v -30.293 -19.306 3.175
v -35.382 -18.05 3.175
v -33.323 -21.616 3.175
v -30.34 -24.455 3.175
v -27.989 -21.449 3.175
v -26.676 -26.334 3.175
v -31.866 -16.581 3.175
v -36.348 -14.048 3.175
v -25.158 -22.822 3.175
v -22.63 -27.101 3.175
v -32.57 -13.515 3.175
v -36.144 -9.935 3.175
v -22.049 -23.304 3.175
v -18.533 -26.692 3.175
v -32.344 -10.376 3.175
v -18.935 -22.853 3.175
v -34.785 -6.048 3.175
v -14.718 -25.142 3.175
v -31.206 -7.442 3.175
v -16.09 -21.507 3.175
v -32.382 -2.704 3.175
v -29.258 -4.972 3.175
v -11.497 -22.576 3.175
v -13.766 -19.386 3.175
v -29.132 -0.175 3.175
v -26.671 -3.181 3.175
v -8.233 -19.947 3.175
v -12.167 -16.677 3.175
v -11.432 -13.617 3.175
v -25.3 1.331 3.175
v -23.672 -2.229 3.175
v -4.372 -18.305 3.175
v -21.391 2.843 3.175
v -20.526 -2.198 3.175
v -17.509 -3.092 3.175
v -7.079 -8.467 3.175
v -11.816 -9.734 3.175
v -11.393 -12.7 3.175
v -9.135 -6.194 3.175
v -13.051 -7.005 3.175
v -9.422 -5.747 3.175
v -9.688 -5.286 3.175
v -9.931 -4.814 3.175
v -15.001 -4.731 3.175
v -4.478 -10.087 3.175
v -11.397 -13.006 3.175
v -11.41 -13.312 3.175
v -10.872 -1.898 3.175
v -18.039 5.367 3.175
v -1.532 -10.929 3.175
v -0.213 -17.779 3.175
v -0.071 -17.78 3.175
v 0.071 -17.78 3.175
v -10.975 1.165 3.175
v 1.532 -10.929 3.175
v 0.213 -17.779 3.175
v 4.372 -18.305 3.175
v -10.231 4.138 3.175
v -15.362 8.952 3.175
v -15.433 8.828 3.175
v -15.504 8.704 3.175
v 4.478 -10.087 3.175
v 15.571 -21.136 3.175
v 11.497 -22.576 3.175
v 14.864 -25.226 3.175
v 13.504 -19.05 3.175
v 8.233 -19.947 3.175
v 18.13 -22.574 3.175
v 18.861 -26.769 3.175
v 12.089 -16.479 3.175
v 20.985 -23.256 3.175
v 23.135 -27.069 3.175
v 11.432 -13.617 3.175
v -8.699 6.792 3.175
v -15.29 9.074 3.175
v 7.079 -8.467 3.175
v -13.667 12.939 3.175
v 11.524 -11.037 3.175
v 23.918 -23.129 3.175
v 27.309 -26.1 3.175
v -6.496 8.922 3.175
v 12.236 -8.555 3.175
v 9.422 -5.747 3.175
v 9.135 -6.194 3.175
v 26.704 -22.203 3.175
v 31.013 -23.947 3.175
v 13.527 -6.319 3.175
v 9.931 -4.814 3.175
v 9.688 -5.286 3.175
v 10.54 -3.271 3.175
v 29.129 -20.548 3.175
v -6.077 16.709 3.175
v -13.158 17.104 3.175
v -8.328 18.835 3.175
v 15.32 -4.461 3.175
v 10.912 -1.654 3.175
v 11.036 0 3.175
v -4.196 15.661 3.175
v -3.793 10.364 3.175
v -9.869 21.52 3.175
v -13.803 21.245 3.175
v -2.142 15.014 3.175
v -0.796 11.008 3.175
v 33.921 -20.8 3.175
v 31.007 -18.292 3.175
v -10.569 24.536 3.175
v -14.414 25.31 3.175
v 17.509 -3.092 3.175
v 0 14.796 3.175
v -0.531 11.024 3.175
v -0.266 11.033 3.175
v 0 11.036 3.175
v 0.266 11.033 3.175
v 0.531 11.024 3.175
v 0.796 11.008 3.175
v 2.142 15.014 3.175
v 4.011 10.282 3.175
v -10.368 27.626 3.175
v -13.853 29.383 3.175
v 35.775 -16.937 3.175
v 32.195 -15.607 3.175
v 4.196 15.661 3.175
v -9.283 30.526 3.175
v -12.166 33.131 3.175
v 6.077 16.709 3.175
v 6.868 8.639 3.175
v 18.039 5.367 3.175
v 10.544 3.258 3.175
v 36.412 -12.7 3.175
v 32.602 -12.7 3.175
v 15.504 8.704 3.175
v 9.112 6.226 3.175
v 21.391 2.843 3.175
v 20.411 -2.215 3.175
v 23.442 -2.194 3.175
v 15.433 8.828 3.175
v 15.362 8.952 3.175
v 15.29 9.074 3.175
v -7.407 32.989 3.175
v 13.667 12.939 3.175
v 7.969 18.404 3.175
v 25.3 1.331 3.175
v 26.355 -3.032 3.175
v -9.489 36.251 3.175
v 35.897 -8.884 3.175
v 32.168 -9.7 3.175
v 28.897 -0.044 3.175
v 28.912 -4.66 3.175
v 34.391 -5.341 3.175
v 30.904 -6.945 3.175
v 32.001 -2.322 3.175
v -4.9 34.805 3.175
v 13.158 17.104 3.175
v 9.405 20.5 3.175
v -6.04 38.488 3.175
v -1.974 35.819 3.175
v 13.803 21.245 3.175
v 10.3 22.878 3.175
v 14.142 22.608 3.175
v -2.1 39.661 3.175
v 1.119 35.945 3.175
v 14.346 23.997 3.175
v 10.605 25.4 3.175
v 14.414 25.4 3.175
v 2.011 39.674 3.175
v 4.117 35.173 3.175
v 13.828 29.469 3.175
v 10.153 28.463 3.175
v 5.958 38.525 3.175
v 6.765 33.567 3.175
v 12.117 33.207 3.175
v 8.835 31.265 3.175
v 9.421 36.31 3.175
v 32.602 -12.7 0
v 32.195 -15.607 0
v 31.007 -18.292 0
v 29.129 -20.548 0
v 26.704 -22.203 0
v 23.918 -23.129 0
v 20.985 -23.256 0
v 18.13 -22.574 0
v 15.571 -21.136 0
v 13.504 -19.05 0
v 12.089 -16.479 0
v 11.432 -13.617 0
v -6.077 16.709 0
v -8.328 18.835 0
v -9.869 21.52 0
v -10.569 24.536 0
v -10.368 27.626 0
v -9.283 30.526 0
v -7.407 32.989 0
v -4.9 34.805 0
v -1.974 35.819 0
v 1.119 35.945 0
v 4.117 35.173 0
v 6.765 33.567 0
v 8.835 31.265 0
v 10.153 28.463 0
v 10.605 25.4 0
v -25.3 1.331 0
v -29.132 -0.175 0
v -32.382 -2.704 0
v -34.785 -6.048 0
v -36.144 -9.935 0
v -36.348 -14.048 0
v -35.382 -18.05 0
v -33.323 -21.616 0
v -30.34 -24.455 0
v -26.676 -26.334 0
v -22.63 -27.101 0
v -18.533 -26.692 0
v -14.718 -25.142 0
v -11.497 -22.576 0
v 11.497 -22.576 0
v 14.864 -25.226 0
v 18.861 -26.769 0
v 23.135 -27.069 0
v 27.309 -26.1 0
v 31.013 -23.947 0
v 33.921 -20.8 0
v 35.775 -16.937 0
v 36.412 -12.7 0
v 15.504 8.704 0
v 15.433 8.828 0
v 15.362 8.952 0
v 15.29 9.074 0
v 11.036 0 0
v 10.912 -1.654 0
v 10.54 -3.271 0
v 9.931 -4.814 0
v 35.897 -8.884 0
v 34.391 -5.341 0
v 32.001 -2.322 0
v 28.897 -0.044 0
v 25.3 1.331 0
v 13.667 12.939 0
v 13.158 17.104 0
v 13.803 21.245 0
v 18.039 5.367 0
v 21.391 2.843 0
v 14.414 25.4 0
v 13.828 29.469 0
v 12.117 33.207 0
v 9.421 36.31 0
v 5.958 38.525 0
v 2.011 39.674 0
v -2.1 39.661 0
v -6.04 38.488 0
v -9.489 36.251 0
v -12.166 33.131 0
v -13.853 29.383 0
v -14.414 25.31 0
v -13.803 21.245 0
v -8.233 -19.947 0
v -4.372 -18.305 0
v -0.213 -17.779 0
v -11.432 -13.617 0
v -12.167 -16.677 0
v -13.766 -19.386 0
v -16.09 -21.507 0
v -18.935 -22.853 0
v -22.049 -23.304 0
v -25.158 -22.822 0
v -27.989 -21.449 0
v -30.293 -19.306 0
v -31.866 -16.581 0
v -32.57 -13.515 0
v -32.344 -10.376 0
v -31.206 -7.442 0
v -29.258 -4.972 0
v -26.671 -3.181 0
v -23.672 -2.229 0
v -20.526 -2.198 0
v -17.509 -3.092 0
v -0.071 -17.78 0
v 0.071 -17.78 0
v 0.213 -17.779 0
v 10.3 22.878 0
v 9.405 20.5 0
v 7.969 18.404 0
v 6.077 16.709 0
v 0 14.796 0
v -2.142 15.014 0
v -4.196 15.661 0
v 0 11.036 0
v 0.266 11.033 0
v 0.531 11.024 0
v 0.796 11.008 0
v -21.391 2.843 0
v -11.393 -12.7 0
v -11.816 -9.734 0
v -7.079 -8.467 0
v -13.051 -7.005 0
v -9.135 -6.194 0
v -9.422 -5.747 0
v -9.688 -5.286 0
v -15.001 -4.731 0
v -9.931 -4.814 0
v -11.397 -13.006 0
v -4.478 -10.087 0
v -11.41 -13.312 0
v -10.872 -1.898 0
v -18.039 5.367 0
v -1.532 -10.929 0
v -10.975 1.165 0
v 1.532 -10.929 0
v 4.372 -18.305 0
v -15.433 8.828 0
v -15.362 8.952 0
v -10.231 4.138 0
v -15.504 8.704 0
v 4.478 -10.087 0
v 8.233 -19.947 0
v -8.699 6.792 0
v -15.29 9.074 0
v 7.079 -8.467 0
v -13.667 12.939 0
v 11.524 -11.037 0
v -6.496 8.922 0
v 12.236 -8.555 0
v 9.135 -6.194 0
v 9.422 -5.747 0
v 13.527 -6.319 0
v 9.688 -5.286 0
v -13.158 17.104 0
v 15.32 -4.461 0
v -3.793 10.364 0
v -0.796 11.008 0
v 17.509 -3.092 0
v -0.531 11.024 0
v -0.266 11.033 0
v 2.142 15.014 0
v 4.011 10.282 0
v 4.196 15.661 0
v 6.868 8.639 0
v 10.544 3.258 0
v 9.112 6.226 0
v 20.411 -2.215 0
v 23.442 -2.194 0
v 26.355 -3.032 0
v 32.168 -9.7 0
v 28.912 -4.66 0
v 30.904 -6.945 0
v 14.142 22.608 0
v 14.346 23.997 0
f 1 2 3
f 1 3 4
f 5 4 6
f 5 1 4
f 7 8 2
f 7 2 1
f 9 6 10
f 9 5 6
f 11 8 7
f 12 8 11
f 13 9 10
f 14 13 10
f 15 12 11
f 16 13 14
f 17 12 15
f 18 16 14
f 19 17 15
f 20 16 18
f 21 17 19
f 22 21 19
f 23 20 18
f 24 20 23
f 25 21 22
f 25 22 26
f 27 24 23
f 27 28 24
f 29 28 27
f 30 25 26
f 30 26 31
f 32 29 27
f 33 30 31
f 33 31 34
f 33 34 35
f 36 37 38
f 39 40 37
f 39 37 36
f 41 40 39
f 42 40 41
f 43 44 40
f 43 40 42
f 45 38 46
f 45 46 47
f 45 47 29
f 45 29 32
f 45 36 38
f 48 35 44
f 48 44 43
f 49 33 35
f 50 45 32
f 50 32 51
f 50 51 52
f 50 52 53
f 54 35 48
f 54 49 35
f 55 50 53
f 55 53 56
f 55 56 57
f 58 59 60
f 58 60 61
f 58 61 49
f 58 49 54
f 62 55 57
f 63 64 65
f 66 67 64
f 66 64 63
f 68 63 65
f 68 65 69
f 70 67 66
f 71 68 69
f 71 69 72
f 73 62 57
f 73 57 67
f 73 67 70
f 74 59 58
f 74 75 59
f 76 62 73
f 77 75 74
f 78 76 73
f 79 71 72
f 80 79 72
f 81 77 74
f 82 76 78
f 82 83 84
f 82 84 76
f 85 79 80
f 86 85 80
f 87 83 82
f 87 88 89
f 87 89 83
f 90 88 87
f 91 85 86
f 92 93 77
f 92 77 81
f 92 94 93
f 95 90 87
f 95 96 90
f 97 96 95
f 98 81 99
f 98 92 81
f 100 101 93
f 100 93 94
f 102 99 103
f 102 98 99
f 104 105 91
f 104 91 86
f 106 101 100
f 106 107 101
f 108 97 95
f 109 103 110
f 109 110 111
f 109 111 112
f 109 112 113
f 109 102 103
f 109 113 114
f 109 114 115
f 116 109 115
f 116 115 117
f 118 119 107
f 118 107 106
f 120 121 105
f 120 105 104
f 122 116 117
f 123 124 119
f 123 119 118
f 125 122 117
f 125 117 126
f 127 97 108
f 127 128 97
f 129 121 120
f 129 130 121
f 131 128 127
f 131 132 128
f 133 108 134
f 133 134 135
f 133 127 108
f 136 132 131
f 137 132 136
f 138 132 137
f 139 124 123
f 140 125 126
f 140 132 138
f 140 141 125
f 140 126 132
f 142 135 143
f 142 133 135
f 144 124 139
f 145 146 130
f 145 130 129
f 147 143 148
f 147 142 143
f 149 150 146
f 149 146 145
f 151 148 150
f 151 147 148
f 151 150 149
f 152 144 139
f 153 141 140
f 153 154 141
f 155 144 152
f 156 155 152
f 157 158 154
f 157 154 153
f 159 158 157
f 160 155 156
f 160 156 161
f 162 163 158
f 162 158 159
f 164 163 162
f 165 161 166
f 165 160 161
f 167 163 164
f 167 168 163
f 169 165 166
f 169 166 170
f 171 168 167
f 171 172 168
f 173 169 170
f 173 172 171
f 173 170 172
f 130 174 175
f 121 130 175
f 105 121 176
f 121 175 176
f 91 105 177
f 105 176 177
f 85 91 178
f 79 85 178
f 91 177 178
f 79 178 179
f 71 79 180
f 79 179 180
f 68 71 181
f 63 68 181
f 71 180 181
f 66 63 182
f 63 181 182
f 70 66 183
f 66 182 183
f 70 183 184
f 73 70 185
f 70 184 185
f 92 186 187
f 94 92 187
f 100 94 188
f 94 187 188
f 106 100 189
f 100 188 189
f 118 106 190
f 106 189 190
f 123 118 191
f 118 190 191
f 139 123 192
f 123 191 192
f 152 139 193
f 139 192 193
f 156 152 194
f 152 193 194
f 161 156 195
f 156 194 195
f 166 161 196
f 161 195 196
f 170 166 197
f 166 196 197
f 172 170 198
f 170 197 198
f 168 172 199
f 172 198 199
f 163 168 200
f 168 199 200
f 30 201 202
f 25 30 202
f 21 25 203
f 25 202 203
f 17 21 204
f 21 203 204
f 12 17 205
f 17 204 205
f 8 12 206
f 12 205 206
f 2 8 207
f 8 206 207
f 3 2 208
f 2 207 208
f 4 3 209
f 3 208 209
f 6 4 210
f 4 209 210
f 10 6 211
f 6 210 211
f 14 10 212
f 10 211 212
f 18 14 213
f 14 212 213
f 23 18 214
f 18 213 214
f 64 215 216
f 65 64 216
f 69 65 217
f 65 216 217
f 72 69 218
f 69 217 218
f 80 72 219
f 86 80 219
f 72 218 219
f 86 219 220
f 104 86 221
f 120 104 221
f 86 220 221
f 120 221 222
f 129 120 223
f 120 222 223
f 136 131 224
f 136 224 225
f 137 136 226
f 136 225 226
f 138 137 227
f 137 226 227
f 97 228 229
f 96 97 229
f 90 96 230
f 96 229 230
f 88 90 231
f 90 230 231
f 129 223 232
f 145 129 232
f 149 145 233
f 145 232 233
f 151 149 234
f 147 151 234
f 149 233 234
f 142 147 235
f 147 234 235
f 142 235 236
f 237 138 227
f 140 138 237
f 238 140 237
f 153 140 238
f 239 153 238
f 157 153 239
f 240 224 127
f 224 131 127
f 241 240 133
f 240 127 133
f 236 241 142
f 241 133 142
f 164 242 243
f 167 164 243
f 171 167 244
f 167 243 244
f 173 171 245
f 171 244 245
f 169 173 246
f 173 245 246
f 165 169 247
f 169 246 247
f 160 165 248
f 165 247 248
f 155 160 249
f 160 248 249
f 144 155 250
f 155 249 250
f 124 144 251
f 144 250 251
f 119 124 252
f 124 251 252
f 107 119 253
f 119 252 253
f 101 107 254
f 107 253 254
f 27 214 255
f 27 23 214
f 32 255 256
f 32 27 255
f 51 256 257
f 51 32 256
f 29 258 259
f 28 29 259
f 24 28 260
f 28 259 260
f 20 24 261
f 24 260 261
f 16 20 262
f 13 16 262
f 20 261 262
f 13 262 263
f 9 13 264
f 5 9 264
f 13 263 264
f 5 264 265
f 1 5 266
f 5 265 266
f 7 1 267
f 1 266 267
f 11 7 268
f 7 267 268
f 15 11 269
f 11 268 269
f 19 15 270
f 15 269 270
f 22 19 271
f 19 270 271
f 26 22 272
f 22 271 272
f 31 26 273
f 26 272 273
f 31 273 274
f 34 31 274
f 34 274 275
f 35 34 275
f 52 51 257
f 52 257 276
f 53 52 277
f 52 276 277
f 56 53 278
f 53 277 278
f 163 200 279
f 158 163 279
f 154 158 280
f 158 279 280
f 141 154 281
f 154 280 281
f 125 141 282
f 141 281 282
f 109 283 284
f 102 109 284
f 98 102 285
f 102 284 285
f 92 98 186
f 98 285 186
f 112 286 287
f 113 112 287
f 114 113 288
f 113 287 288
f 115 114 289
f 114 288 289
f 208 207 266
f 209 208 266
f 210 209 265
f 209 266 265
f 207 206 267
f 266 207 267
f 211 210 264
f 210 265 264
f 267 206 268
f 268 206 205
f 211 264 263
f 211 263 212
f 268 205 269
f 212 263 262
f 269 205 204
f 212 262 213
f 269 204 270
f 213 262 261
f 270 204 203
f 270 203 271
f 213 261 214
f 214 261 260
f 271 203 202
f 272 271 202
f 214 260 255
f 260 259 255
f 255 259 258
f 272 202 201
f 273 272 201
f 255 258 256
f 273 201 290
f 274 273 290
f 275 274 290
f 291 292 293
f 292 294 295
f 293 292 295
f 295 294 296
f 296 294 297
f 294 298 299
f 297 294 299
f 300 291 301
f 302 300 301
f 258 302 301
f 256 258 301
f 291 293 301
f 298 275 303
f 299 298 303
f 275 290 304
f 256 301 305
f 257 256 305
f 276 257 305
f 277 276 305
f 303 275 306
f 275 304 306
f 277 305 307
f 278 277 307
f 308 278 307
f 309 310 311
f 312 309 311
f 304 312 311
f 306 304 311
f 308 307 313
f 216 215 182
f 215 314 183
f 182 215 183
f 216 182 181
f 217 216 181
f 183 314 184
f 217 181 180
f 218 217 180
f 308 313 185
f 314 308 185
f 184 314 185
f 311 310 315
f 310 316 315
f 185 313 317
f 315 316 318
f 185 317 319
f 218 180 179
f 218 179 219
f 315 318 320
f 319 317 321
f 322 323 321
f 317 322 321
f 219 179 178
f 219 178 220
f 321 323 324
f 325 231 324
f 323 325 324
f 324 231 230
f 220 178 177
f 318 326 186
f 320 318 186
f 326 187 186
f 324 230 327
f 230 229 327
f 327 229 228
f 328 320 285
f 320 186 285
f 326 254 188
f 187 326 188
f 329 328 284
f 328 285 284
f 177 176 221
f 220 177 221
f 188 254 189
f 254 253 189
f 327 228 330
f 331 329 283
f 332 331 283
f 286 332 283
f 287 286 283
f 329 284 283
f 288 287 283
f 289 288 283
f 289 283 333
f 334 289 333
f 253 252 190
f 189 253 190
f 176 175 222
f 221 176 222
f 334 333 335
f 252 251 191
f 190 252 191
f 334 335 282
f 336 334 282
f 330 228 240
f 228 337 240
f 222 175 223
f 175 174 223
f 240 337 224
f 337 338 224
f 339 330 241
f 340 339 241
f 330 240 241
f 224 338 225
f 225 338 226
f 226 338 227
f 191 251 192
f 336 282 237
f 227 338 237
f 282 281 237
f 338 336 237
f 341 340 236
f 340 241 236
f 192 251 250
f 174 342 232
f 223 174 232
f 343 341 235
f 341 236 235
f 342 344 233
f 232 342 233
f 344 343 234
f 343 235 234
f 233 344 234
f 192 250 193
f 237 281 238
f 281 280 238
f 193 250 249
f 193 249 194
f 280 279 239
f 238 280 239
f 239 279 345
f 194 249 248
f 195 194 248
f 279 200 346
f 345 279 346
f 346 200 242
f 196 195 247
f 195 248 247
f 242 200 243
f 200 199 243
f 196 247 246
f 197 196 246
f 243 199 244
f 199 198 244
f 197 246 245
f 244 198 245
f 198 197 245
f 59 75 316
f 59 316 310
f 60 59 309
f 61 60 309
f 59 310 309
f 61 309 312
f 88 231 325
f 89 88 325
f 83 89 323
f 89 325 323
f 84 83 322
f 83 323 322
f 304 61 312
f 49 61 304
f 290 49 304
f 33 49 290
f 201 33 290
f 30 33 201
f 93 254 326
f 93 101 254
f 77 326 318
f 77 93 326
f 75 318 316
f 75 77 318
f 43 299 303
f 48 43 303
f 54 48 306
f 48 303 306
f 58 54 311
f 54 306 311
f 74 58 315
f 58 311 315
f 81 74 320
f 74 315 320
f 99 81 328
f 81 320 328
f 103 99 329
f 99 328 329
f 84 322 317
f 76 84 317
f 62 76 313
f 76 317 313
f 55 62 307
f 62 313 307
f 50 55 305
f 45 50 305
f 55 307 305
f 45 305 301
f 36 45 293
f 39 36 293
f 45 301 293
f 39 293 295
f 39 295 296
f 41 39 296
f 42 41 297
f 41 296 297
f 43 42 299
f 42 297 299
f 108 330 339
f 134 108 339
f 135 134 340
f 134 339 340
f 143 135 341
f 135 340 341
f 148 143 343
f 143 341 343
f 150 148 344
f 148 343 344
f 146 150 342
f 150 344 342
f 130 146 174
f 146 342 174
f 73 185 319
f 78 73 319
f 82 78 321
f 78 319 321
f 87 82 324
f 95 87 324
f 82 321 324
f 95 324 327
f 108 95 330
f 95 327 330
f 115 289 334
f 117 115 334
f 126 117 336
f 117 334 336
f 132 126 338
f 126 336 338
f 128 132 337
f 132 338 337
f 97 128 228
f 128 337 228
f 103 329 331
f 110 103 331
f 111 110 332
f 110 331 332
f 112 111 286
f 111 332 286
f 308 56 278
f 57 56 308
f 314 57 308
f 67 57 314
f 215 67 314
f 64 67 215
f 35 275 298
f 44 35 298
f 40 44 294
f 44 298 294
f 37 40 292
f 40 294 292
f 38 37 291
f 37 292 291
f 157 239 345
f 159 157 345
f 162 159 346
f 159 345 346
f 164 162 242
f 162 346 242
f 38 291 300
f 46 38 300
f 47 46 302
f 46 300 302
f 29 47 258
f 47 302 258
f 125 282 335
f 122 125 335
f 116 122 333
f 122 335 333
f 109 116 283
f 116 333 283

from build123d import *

# Parameters (mm, degrees)
F1_DEPTH = 3.175
F2_R     = 15.24


with BuildPart() as f1:
    # F0 (on Top) → F1 (new body)
    with BuildSketch(Plane.XY):
        with BuildLine():
            ThreePointArc((-0.7964807044, 11.0075218), (-0.3985002187, 11.0291031034), (0, 11.0363))
            Line((0, 11.0363), (0, 14.7955))
            ThreePointArc((0, 14.7955), (-3.1855144618, 15.2852623433), (-6.0767868514, 16.709310625))
            ThreePointArc((-6.0767868514, 16.709310625), (-7.9955151986, 15.8808103291), (-9.803769889, 14.832885625))
            ThreePointArc((-9.803769889, 14.832885625), (-5.6346854623, 12.132440692), (-0.7964807044, 11.0075218))
        make_face()
        with BuildLine():
            Line((0, 14.7955), (0, 11.0363))
            ThreePointArc((0, 11.0363), (0.3985002187, 11.0291031034), (0.7964807044, 11.0075218))
            ThreePointArc((0.7964807044, 11.0075218), (5.6346854623, 12.132440692), (9.803769889, 14.832885625))
            ThreePointArc((9.803769889, 14.832885625), (7.9955151986, 15.8808103291), (6.0767868514, 16.709310625))
            ThreePointArc((6.0767868514, 16.709310625), (3.1855144618, 15.2852623433), (0, 14.7955))
        make_face()
        with BuildLine():
            ThreePointArc((-9.9310338637, -4.8139883763), (-9.5577161638, 5.51815), (-0.7964807044, 11.0075218))
            ThreePointArc((-0.7964807044, 11.0075218), (-5.6346854623, 12.132440692), (-9.803769889, 14.832885625))
            ThreePointArc((-9.803769889, 14.832885625), (-15.3979316793, 8.89), (-17.7475407072, 1.0738709642))
            ThreePointArc((-17.7475407072, 1.0738709642), (-13.3243445803, -1.1864395933), (-9.9310338637, -4.8139883763))
        make_face()
        with BuildLine():
            ThreePointArc((9.803769889, 14.832885625), (5.6346854623, 12.132440692), (0.7964807044, 11.0075218))
            ThreePointArc((0.7964807044, 11.0075218), (8.0805358018, 7.5169713879), (11.0363, 0))
            ThreePointArc((11.0363, 0), (10.7564349745, -2.4696202805), (9.9310338637, -4.8139883763))
            ThreePointArc((9.9310338637, -4.8139883763), (13.3243445803, -1.1864395933), (17.7475407072, 1.0738709642))
            ThreePointArc((17.7475407072, 1.0738709642), (15.3979316793, 8.89), (9.803769889, 14.832885625))
        make_face()
        with BuildLine():
            ThreePointArc((-9.1345531593, -6.1935334237), (-9.5577161638, -5.51815), (-9.9310338637, -4.8139883763))
            ThreePointArc((-9.9310338637, -4.8139883763), (-13.3243445803, -1.1864395933), (-17.7475407072, 1.0738709642))
            ThreePointArc((-17.7475407072, 1.0738709642), (-17.750942777, -1.0160858862), (-17.5090809067, -3.0920035258))
            ThreePointArc((-17.5090809067, -3.0920035258), (-13.0514307386, -7.0051425696), (-11.3925452561, -12.7))
            ThreePointArc((-11.3925452561, -12.7), (-11.4024871162, -13.1590839469), (-11.4322940553, -13.6173070992))
            ThreePointArc((-11.4322940553, -13.6173070992), (-9.7554275784, -14.8647244429), (-7.9437708182, -15.9067565892))
            ThreePointArc((-7.9437708182, -15.9067565892), (-7.6731363163, -14.3135188044), (-7.5825452561, -12.7))
            ThreePointArc((-7.5825452561, -12.7), (-7.9759147279, -9.3554957079), (-9.1345531593, -6.1935334237))
        make_face()
        with BuildLine():
            ThreePointArc((14.4145, 25.4), (-5.7646061958, 38.6116284256), (-9.803769889, 14.832885625))
            ThreePointArc((-9.803769889, 14.832885625), (-7.9955151986, 15.8808103291), (-6.0767868514, 16.709310625))
            ThreePointArc((-6.0767868514, 16.709310625), (-4.8997007095, 34.8046984645), (10.6045, 25.4))
            ThreePointArc((10.6045, 25.4), (9.4046984645, 20.5002992905), (6.0767868514, 16.709310625))
            ThreePointArc((6.0767868514, 16.709310625), (7.9955151986, 15.8808103291), (9.803769889, 14.832885625))
            ThreePointArc((9.803769889, 14.832885625), (13.2116284256, 19.6353938042), (14.4145, 25.4))
        make_face()
        with BuildLine():
            ThreePointArc((9.1345531593, -6.1935334237), (0, -11.0363), (-9.1345531593, -6.1935334237))
            ThreePointArc((-9.1345531593, -6.1935334237), (-7.9759147279, -9.3554957079), (-7.5825452561, -12.7))
            ThreePointArc((-7.5825452561, -12.7), (-7.6731363163, -14.3135188044), (-7.9437708182, -15.9067565892))
            ThreePointArc((-7.9437708182, -15.9067565892), (0, -17.78), (7.9437708182, -15.9067565892))
            ThreePointArc((7.9437708182, -15.9067565892), (7.689659118, -10.9460010987), (9.1345531593, -6.1935334237))
        make_face()
        with BuildLine():
            ThreePointArc((-17.5090809067, -3.0920035258), (-17.750942777, -1.0160858862), (-17.7475407072, 1.0738709642))
            ThreePointArc((-17.7475407072, 1.0738709642), (-34.480368439, -19.90725), (-7.9437708182, -15.9067565892))
            ThreePointArc((-7.9437708182, -15.9067565892), (-9.7554275784, -14.8647244429), (-11.4322940553, -13.6173070992))
            ThreePointArc((-11.4322940553, -13.6173070992), (-31.1808116506, -18.00225), (-17.5090809067, -3.0920035258))
        make_face()
        with BuildLine():
            ThreePointArc((17.7475407072, 1.0738709642), (13.3243445803, -1.1864395933), (9.9310338637, -4.8139883763))
            ThreePointArc((9.9310338637, -4.8139883763), (9.5577161638, -5.51815), (9.1345531593, -6.1935334237))
            ThreePointArc((9.1345531593, -6.1935334237), (7.689659118, -10.9460010987), (7.9437708182, -15.9067565892))
            ThreePointArc((7.9437708182, -15.9067565892), (9.7554275784, -14.8647244429), (11.4322940553, -13.6173070992))
            ThreePointArc((11.4322940553, -13.6173070992), (12.8132788617, -7.39775), (17.5090809067, -3.0920035258))
            ThreePointArc((17.5090809067, -3.0920035258), (17.7121407306, -1.5519248499), (17.78, 0))
            ThreePointArc((17.78, 0), (17.7718833241, 0.5371807083), (17.7475407072, 1.0738709642))
        make_face()
        with BuildLine():
            ThreePointArc((36.4115452561, -12.7), (30.5563480002, -1.1018903788), (17.7475407072, 1.0738709642))
            ThreePointArc((17.7475407072, 1.0738709642), (17.7718833241, 0.5371807083), (17.78, 0))
            ThreePointArc((17.78, 0), (17.7121407306, -1.5519248499), (17.5090809067, -3.0920035258))
            ThreePointArc((17.5090809067, -3.0920035258), (27.6919026866, -3.7543854824), (32.6015452561, -12.7))
            ThreePointArc((32.6015452561, -12.7), (22.456129203, -23.2945581399), (11.4322940553, -13.6173070992))
            ThreePointArc((11.4322940553, -13.6173070992), (9.7554275784, -14.8647244429), (7.9437708182, -15.9067565892))
            ThreePointArc((7.9437708182, -15.9067565892), (23.6105640606, -27.0239089399), (36.4115452561, -12.7))
        make_face()
    extrude(amount=F1_DEPTH)

    # F2
    f2_edges = [f1.edges().sort_by_distance(p)[0] for p in [
        (-9.80377, 14.832886, 1.5875),
        (-17.747541, 1.073871, 1.5875),
        (-7.943771, -15.906757, 1.5875),
        (17.747541, 1.073871, 1.5875),
        (7.943771, -15.906757, 1.5875),
        (9.80377, 14.832886, 1.5875),
    ]]
    fillet(f2_edges, radius=F2_R)


solid = f1.part
